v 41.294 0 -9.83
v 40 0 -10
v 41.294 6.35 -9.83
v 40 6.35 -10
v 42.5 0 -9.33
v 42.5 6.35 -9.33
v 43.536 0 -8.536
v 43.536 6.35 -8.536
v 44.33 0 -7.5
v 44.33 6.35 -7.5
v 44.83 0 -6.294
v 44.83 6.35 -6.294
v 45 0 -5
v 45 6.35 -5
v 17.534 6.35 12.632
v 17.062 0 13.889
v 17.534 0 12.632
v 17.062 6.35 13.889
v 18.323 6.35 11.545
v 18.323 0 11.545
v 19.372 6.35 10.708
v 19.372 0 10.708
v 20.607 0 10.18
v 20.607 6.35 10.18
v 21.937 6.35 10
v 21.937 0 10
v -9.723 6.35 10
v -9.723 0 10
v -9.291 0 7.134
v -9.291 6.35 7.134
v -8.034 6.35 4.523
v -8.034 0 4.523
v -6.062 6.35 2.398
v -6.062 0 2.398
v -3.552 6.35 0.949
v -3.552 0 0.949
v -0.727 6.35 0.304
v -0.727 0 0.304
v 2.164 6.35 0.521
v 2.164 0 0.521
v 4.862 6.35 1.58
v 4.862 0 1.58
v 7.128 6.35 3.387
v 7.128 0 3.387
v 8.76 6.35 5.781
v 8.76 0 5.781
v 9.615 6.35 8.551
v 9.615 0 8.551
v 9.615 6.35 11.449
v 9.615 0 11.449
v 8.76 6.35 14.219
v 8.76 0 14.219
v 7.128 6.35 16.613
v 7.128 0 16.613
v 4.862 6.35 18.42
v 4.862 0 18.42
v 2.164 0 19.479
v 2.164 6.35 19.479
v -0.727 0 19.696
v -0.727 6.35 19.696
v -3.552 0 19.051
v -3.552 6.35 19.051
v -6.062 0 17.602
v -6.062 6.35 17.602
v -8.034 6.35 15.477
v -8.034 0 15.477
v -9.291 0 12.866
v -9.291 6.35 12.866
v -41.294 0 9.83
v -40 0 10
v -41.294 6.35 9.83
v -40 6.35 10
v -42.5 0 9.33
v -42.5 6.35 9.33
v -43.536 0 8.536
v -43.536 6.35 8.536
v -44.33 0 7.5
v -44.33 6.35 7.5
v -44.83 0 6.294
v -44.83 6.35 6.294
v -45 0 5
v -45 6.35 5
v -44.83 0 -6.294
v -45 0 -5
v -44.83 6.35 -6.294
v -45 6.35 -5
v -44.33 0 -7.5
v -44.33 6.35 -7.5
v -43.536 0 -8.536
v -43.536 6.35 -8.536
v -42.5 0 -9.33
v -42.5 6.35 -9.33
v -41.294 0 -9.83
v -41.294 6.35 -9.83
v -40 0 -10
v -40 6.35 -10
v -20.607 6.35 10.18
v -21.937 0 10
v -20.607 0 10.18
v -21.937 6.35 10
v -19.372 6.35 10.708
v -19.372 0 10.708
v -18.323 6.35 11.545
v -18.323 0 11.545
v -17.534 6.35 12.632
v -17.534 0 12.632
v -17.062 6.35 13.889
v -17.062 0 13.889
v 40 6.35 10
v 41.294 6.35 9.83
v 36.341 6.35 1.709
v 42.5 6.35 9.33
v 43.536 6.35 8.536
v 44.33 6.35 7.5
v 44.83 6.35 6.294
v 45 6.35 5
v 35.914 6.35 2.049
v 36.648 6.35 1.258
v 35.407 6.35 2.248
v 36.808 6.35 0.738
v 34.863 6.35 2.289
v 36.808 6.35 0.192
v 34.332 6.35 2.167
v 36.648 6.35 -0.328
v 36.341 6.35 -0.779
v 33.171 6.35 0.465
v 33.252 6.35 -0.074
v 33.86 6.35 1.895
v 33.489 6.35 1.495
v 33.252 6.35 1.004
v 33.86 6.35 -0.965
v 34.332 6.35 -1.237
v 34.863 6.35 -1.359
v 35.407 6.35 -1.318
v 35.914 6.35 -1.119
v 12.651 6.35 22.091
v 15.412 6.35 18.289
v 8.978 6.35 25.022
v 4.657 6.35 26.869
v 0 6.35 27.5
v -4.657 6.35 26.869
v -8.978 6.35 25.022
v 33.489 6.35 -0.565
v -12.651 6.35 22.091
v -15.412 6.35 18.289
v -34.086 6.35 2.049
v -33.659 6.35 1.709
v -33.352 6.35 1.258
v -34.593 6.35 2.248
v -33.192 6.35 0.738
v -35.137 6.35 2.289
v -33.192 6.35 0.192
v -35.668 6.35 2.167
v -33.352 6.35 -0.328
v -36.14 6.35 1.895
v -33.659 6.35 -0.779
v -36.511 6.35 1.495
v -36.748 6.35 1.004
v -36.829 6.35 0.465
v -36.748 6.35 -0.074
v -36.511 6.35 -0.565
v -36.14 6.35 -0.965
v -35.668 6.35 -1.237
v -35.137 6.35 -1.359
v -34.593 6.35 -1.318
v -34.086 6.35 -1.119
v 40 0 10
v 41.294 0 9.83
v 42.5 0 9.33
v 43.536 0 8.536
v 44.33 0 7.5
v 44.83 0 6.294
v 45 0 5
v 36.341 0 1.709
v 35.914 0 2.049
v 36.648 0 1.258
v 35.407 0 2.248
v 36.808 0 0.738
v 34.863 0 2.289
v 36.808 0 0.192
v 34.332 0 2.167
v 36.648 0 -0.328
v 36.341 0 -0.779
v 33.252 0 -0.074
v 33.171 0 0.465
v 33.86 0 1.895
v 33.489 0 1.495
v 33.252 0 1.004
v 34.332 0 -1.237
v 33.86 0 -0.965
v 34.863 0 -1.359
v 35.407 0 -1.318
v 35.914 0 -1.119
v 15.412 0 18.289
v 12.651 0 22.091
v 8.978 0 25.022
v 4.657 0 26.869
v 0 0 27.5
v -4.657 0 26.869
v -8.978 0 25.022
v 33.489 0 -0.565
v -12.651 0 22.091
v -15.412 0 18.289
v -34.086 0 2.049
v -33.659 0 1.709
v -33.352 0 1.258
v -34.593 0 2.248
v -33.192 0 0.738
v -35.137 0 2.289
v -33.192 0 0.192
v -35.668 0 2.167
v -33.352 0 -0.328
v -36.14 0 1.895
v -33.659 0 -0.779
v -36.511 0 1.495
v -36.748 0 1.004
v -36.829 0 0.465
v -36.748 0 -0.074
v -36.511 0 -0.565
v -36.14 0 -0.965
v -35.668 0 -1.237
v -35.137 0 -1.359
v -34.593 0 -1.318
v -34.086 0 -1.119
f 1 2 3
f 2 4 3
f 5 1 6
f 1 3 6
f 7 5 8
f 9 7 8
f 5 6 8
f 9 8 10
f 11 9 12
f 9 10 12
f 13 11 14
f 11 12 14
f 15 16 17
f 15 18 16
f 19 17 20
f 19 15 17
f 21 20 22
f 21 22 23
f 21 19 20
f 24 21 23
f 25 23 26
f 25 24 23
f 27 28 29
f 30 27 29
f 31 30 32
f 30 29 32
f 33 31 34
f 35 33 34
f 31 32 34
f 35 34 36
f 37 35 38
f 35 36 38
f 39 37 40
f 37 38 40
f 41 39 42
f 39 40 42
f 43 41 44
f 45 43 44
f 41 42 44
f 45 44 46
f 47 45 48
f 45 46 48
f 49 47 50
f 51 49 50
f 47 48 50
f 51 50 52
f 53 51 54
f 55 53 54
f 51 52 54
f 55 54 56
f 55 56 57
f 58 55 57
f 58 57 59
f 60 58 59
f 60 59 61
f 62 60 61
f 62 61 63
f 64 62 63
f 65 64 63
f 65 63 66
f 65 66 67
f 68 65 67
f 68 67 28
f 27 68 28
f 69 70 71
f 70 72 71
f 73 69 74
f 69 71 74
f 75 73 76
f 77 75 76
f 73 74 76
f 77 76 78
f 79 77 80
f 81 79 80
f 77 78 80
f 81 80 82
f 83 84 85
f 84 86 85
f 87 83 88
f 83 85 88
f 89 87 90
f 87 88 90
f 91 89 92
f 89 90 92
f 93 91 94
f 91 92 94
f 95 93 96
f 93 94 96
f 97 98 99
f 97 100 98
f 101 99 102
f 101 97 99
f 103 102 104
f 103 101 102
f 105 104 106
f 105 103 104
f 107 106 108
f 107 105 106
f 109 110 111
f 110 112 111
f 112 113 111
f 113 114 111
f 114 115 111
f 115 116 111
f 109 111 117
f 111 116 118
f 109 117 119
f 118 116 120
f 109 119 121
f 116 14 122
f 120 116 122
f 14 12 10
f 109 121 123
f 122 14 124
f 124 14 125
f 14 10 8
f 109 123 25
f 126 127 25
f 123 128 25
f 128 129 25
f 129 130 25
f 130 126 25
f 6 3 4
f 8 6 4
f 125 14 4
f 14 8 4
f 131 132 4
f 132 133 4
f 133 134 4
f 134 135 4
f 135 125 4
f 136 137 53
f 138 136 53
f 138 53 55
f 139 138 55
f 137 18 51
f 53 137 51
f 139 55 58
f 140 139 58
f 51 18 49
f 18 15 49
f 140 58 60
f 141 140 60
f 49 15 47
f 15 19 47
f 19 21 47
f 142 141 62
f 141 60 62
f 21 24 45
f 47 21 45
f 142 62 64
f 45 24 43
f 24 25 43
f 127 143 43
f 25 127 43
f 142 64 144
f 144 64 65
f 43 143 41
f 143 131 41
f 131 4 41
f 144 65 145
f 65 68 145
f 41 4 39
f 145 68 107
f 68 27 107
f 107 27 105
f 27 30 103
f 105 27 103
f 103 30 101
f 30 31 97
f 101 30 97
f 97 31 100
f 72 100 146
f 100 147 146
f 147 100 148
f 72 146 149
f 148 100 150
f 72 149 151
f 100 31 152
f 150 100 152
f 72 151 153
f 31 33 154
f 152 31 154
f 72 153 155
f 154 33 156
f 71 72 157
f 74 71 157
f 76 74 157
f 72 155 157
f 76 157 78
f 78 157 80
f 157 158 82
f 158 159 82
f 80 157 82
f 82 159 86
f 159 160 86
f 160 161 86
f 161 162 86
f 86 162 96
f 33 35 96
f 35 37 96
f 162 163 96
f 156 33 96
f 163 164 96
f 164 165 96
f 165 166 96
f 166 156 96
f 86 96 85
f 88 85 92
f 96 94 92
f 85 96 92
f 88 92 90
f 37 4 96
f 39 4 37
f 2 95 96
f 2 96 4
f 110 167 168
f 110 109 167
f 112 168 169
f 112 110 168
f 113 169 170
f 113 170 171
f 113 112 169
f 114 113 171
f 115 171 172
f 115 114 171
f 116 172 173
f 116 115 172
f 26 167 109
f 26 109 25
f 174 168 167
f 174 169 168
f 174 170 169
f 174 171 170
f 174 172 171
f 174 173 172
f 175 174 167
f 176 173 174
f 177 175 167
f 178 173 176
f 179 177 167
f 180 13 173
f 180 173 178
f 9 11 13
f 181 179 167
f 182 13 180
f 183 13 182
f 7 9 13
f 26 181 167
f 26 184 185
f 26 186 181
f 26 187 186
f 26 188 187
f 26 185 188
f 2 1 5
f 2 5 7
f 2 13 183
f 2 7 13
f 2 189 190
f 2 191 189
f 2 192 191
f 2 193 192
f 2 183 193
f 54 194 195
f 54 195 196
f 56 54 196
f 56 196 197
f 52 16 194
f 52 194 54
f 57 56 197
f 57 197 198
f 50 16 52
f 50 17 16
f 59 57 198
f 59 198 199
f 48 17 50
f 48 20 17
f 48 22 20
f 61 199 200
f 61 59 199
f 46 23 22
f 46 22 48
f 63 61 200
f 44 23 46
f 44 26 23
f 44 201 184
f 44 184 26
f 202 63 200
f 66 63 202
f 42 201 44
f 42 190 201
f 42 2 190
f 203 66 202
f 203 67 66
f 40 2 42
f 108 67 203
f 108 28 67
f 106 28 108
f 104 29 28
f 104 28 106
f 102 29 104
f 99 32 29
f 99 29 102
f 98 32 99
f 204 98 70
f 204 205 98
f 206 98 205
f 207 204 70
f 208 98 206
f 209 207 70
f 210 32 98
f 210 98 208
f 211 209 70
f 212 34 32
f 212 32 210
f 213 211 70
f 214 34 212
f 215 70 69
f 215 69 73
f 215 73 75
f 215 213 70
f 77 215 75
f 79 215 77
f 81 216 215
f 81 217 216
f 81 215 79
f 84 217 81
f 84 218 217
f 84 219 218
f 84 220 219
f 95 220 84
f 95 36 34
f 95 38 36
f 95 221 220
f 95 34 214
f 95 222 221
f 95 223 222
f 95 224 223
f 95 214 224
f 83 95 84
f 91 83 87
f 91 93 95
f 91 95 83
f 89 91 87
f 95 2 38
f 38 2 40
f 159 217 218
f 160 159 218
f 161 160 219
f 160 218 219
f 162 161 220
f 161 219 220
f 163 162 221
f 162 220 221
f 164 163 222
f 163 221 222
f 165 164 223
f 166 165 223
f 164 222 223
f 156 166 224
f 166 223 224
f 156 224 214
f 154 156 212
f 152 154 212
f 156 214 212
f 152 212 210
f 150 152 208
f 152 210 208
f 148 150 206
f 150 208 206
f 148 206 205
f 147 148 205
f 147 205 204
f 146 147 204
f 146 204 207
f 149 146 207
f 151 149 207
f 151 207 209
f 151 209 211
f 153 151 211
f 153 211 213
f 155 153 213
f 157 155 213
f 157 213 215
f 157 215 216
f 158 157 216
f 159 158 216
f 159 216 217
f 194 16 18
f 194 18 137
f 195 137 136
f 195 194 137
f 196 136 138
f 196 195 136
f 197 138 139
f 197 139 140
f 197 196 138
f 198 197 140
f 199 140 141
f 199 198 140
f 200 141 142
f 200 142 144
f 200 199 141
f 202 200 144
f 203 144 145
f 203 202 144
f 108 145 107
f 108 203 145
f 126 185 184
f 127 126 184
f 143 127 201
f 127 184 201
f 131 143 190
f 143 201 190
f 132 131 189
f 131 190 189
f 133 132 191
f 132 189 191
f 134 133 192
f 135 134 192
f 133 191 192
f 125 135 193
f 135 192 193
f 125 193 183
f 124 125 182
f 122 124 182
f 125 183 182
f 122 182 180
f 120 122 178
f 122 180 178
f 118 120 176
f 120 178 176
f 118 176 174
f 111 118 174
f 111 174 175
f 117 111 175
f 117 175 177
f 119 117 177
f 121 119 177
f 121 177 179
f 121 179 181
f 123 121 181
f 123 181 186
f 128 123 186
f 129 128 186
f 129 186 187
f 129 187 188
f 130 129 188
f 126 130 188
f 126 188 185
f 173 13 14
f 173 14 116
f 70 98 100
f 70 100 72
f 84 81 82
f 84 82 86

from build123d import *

# Parameters (mm, degrees)
BOSS_EXTRUDE1_DEPTH     = 6.35
F_3_4_CLEARANCE_HOLE1_D = 19.44624
FILLET1_R               = 5
F_6_CLEARANCE_HOLE1_D   = 3.6576


with BuildPart() as part:
    # Sketch1 → Boss-Extrude1 (new body)
    with BuildSketch(Plane(origin=(0, 0, 0), x_dir=(1, 0, 0), z_dir=(0, 1, 0))):
        with BuildLine():
            Line((-17.5, -10), (-45, -10))
            Line((-45, -10), (-45, 10))
            Line((-45, 10), (45, 10))
            Line((45, 10), (45, -10))
            Line((45, -10), (17.5, -10))
            ThreePointArc((17.5, -10), (0, -27.5), (-17.5, -10))
        make_face()
    extrude(amount=BOSS_EXTRUDE1_DEPTH)

    # 3/4 Clearance Hole1 (through all)
    with Locations(Plane(origin=(0, 6.35, 0), x_dir=(1, 0, 0), z_dir=(0, 1, 0))):
        with Locations((0, -10)):
            Hole(F_3_4_CLEARANCE_HOLE1_D / 2)

    # Fillet1
    fillet1_edges = [part.edges().sort_by_distance(p)[0] for p in [
        (-45, 3.175, -10),
        (45, 3.175, -10),
        (45, 3.175, 10),
        (17.5, 3.175, 10),
        (-17.5, 3.175, 10),
        (-45, 3.175, 10),
    ]]
    fillet(fillet1_edges, radius=FILLET1_R)

    # #6 Clearance Hole1 (through all)
    with Locations(Plane(origin=(0, 6.35, 0), x_dir=(1, 0, 0), z_dir=(0, 1, 0))):
        with Locations((-35, -0.465), (35, -0.465)):
            Hole(F_6_CLEARANCE_HOLE1_D / 2)


solid = part.part
